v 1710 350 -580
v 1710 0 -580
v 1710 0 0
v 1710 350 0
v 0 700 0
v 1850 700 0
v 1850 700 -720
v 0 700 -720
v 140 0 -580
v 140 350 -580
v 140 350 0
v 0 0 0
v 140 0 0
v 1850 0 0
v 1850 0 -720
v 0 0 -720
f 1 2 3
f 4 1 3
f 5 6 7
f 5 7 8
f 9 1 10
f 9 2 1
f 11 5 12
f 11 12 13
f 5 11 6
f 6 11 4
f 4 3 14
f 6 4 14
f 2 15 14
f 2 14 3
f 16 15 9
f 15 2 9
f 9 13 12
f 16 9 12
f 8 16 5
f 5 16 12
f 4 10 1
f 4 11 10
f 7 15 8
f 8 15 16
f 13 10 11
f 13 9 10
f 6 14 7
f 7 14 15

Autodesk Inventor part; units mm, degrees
ref_plane "YZ Plane" through (0, 0, 0) normal (1, 0, 0) x (0, 1, 0)
ref_plane "XZ Plane" through (0, 0, 0) normal (0, 1, 0) x (-1, 0, 0)
ref_plane "XY Plane" through (0, 0, 0) normal (0, 0, 1) x (1, 0, 0)
sketch "Boceto1" plane through (0, 0, 0) normal (0, 1, 0) x (-1, 0, 0)
  line L0 (0, 0) -> (-1850, 0)
  line L1 (-1850, 0) -> (-1850, -720)
  line L2 (-1850, -720) -> (0, -720)
  line L3 (0, -720) -> (0, 0)
  dimension "d0" = 1850
  dimension "d1" = 720
extrude "Extrusión1" add sketch "Boceto1" along normal blind 700
sketch "Boceto2" plane through (0, 0, 0) normal (0, -1, 0) x (1, 0, 0)
  line L0 (1850, 0) -> (1850, -720) projected
  line L1 (0, 0) -> (1850, 0) projected
  line L2 (0, -720) -> (0, 0) projected
  line L3 (1850, -720) -> (0, -720) projected
  line L4 (140, -580) -> (140, -140)
  line L5 (1710, -140) -> (1710, -580)
  line L6 (1710, -580) -> (140, -580)
  line L7 (1710, -140) -> (1710, 0)
  line L8 (140, -140) -> (140, 0)
  dimension "d4" = 140
extrude "Extrusión2" cut sketch "Boceto2" against normal blind 350 contours L7 L5 L6 L4 L8 L1
properties part number "sofa"
